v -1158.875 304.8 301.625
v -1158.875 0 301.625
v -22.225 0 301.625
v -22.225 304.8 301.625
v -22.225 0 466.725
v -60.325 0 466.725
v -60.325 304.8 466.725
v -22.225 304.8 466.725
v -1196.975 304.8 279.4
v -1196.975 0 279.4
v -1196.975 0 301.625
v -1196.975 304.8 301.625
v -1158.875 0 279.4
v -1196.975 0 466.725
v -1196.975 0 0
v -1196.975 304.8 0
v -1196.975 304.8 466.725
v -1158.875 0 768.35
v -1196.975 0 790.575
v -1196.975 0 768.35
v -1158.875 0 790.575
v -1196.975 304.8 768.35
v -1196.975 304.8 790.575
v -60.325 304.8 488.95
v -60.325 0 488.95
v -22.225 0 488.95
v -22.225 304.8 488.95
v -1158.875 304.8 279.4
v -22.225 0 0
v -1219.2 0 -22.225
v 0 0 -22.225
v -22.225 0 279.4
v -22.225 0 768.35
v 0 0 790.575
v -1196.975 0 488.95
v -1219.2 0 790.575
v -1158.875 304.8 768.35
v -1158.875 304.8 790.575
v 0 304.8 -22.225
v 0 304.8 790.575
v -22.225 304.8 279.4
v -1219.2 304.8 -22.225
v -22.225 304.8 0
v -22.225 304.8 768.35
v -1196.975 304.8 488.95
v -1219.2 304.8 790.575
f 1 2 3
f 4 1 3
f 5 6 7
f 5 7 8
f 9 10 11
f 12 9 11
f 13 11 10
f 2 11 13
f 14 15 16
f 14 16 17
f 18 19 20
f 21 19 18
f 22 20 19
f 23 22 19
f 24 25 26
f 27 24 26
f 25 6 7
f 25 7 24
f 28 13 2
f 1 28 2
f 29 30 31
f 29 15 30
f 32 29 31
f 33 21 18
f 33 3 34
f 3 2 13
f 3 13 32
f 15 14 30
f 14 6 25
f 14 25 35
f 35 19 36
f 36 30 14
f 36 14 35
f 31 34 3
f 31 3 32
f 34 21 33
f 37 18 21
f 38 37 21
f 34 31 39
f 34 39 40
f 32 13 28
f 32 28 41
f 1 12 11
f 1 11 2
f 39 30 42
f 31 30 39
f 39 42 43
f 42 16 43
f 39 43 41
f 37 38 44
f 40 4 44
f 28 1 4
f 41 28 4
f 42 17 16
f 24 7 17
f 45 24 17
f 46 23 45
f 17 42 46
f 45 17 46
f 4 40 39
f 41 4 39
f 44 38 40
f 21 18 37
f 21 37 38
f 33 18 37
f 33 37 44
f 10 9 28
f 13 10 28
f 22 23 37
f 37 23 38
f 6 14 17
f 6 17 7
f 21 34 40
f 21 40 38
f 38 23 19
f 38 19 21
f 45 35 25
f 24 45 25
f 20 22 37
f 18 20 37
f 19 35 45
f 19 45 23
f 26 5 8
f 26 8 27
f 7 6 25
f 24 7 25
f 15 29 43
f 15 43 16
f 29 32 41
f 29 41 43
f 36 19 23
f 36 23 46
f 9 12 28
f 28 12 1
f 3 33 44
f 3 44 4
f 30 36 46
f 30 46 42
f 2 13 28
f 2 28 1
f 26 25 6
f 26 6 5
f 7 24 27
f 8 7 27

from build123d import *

# Parameters (mm, degrees)
F0_W     = 1136.65
F0_H     = 22.225
F1_DEPTH = 304.8
F0_W_2   = 38.1
F2_DEPTH = 304.8


with BuildPart() as f1:
    # F0 (on Front) → F1 (new body)
    with BuildSketch(Plane.XZ):
        with Locations((-590.55, 779.4625)):
            Rectangle(F0_W, F0_H)
        Polygon((-1219.2, 0), (-1196.975, 0), (-1196.975, 279.4), (-1196.975, 301.625), (-1196.975, 466.725), (-1196.975, 488.95), (-1196.975, 768.35), (-1196.975, 790.575), (-1219.2, 790.575), align=None)
        with Locations((-628.65, 477.8375)):
            Rectangle(F0_W, F0_H)
        Polygon((-22.225, 0), (0, 0), (0, 790.575), (-22.225, 790.575), (-22.225, 768.35), (-22.225, 488.95), (-22.225, 466.725), (-22.225, 301.625), (-22.225, 279.4), align=None)
        with Locations((-590.55, 290.5125)):
            Rectangle(F0_W, F0_H)
        Polygon((0, -22.225), (0, 0), (-22.225, 0), (-1196.975, 0), (-1219.2, 0), (-1219.2, -22.225), align=None)
    extrude(amount=-F1_DEPTH)


with BuildPart() as f2:
    # F0 (on Front) → F2 (new body)
    with BuildSketch(Plane.XZ):
        with Locations((-1177.925, 779.4625)):
            Rectangle(F0_W_2, F0_H)
        with Locations((-41.275, 477.8375)):
            Rectangle(F0_W_2, F0_H)
        with Locations((-1177.925, 290.5125)):
            Rectangle(F0_W_2, F0_H)
    extrude(amount=-F2_DEPTH)


solid = Compound([f1.part, f2.part])
